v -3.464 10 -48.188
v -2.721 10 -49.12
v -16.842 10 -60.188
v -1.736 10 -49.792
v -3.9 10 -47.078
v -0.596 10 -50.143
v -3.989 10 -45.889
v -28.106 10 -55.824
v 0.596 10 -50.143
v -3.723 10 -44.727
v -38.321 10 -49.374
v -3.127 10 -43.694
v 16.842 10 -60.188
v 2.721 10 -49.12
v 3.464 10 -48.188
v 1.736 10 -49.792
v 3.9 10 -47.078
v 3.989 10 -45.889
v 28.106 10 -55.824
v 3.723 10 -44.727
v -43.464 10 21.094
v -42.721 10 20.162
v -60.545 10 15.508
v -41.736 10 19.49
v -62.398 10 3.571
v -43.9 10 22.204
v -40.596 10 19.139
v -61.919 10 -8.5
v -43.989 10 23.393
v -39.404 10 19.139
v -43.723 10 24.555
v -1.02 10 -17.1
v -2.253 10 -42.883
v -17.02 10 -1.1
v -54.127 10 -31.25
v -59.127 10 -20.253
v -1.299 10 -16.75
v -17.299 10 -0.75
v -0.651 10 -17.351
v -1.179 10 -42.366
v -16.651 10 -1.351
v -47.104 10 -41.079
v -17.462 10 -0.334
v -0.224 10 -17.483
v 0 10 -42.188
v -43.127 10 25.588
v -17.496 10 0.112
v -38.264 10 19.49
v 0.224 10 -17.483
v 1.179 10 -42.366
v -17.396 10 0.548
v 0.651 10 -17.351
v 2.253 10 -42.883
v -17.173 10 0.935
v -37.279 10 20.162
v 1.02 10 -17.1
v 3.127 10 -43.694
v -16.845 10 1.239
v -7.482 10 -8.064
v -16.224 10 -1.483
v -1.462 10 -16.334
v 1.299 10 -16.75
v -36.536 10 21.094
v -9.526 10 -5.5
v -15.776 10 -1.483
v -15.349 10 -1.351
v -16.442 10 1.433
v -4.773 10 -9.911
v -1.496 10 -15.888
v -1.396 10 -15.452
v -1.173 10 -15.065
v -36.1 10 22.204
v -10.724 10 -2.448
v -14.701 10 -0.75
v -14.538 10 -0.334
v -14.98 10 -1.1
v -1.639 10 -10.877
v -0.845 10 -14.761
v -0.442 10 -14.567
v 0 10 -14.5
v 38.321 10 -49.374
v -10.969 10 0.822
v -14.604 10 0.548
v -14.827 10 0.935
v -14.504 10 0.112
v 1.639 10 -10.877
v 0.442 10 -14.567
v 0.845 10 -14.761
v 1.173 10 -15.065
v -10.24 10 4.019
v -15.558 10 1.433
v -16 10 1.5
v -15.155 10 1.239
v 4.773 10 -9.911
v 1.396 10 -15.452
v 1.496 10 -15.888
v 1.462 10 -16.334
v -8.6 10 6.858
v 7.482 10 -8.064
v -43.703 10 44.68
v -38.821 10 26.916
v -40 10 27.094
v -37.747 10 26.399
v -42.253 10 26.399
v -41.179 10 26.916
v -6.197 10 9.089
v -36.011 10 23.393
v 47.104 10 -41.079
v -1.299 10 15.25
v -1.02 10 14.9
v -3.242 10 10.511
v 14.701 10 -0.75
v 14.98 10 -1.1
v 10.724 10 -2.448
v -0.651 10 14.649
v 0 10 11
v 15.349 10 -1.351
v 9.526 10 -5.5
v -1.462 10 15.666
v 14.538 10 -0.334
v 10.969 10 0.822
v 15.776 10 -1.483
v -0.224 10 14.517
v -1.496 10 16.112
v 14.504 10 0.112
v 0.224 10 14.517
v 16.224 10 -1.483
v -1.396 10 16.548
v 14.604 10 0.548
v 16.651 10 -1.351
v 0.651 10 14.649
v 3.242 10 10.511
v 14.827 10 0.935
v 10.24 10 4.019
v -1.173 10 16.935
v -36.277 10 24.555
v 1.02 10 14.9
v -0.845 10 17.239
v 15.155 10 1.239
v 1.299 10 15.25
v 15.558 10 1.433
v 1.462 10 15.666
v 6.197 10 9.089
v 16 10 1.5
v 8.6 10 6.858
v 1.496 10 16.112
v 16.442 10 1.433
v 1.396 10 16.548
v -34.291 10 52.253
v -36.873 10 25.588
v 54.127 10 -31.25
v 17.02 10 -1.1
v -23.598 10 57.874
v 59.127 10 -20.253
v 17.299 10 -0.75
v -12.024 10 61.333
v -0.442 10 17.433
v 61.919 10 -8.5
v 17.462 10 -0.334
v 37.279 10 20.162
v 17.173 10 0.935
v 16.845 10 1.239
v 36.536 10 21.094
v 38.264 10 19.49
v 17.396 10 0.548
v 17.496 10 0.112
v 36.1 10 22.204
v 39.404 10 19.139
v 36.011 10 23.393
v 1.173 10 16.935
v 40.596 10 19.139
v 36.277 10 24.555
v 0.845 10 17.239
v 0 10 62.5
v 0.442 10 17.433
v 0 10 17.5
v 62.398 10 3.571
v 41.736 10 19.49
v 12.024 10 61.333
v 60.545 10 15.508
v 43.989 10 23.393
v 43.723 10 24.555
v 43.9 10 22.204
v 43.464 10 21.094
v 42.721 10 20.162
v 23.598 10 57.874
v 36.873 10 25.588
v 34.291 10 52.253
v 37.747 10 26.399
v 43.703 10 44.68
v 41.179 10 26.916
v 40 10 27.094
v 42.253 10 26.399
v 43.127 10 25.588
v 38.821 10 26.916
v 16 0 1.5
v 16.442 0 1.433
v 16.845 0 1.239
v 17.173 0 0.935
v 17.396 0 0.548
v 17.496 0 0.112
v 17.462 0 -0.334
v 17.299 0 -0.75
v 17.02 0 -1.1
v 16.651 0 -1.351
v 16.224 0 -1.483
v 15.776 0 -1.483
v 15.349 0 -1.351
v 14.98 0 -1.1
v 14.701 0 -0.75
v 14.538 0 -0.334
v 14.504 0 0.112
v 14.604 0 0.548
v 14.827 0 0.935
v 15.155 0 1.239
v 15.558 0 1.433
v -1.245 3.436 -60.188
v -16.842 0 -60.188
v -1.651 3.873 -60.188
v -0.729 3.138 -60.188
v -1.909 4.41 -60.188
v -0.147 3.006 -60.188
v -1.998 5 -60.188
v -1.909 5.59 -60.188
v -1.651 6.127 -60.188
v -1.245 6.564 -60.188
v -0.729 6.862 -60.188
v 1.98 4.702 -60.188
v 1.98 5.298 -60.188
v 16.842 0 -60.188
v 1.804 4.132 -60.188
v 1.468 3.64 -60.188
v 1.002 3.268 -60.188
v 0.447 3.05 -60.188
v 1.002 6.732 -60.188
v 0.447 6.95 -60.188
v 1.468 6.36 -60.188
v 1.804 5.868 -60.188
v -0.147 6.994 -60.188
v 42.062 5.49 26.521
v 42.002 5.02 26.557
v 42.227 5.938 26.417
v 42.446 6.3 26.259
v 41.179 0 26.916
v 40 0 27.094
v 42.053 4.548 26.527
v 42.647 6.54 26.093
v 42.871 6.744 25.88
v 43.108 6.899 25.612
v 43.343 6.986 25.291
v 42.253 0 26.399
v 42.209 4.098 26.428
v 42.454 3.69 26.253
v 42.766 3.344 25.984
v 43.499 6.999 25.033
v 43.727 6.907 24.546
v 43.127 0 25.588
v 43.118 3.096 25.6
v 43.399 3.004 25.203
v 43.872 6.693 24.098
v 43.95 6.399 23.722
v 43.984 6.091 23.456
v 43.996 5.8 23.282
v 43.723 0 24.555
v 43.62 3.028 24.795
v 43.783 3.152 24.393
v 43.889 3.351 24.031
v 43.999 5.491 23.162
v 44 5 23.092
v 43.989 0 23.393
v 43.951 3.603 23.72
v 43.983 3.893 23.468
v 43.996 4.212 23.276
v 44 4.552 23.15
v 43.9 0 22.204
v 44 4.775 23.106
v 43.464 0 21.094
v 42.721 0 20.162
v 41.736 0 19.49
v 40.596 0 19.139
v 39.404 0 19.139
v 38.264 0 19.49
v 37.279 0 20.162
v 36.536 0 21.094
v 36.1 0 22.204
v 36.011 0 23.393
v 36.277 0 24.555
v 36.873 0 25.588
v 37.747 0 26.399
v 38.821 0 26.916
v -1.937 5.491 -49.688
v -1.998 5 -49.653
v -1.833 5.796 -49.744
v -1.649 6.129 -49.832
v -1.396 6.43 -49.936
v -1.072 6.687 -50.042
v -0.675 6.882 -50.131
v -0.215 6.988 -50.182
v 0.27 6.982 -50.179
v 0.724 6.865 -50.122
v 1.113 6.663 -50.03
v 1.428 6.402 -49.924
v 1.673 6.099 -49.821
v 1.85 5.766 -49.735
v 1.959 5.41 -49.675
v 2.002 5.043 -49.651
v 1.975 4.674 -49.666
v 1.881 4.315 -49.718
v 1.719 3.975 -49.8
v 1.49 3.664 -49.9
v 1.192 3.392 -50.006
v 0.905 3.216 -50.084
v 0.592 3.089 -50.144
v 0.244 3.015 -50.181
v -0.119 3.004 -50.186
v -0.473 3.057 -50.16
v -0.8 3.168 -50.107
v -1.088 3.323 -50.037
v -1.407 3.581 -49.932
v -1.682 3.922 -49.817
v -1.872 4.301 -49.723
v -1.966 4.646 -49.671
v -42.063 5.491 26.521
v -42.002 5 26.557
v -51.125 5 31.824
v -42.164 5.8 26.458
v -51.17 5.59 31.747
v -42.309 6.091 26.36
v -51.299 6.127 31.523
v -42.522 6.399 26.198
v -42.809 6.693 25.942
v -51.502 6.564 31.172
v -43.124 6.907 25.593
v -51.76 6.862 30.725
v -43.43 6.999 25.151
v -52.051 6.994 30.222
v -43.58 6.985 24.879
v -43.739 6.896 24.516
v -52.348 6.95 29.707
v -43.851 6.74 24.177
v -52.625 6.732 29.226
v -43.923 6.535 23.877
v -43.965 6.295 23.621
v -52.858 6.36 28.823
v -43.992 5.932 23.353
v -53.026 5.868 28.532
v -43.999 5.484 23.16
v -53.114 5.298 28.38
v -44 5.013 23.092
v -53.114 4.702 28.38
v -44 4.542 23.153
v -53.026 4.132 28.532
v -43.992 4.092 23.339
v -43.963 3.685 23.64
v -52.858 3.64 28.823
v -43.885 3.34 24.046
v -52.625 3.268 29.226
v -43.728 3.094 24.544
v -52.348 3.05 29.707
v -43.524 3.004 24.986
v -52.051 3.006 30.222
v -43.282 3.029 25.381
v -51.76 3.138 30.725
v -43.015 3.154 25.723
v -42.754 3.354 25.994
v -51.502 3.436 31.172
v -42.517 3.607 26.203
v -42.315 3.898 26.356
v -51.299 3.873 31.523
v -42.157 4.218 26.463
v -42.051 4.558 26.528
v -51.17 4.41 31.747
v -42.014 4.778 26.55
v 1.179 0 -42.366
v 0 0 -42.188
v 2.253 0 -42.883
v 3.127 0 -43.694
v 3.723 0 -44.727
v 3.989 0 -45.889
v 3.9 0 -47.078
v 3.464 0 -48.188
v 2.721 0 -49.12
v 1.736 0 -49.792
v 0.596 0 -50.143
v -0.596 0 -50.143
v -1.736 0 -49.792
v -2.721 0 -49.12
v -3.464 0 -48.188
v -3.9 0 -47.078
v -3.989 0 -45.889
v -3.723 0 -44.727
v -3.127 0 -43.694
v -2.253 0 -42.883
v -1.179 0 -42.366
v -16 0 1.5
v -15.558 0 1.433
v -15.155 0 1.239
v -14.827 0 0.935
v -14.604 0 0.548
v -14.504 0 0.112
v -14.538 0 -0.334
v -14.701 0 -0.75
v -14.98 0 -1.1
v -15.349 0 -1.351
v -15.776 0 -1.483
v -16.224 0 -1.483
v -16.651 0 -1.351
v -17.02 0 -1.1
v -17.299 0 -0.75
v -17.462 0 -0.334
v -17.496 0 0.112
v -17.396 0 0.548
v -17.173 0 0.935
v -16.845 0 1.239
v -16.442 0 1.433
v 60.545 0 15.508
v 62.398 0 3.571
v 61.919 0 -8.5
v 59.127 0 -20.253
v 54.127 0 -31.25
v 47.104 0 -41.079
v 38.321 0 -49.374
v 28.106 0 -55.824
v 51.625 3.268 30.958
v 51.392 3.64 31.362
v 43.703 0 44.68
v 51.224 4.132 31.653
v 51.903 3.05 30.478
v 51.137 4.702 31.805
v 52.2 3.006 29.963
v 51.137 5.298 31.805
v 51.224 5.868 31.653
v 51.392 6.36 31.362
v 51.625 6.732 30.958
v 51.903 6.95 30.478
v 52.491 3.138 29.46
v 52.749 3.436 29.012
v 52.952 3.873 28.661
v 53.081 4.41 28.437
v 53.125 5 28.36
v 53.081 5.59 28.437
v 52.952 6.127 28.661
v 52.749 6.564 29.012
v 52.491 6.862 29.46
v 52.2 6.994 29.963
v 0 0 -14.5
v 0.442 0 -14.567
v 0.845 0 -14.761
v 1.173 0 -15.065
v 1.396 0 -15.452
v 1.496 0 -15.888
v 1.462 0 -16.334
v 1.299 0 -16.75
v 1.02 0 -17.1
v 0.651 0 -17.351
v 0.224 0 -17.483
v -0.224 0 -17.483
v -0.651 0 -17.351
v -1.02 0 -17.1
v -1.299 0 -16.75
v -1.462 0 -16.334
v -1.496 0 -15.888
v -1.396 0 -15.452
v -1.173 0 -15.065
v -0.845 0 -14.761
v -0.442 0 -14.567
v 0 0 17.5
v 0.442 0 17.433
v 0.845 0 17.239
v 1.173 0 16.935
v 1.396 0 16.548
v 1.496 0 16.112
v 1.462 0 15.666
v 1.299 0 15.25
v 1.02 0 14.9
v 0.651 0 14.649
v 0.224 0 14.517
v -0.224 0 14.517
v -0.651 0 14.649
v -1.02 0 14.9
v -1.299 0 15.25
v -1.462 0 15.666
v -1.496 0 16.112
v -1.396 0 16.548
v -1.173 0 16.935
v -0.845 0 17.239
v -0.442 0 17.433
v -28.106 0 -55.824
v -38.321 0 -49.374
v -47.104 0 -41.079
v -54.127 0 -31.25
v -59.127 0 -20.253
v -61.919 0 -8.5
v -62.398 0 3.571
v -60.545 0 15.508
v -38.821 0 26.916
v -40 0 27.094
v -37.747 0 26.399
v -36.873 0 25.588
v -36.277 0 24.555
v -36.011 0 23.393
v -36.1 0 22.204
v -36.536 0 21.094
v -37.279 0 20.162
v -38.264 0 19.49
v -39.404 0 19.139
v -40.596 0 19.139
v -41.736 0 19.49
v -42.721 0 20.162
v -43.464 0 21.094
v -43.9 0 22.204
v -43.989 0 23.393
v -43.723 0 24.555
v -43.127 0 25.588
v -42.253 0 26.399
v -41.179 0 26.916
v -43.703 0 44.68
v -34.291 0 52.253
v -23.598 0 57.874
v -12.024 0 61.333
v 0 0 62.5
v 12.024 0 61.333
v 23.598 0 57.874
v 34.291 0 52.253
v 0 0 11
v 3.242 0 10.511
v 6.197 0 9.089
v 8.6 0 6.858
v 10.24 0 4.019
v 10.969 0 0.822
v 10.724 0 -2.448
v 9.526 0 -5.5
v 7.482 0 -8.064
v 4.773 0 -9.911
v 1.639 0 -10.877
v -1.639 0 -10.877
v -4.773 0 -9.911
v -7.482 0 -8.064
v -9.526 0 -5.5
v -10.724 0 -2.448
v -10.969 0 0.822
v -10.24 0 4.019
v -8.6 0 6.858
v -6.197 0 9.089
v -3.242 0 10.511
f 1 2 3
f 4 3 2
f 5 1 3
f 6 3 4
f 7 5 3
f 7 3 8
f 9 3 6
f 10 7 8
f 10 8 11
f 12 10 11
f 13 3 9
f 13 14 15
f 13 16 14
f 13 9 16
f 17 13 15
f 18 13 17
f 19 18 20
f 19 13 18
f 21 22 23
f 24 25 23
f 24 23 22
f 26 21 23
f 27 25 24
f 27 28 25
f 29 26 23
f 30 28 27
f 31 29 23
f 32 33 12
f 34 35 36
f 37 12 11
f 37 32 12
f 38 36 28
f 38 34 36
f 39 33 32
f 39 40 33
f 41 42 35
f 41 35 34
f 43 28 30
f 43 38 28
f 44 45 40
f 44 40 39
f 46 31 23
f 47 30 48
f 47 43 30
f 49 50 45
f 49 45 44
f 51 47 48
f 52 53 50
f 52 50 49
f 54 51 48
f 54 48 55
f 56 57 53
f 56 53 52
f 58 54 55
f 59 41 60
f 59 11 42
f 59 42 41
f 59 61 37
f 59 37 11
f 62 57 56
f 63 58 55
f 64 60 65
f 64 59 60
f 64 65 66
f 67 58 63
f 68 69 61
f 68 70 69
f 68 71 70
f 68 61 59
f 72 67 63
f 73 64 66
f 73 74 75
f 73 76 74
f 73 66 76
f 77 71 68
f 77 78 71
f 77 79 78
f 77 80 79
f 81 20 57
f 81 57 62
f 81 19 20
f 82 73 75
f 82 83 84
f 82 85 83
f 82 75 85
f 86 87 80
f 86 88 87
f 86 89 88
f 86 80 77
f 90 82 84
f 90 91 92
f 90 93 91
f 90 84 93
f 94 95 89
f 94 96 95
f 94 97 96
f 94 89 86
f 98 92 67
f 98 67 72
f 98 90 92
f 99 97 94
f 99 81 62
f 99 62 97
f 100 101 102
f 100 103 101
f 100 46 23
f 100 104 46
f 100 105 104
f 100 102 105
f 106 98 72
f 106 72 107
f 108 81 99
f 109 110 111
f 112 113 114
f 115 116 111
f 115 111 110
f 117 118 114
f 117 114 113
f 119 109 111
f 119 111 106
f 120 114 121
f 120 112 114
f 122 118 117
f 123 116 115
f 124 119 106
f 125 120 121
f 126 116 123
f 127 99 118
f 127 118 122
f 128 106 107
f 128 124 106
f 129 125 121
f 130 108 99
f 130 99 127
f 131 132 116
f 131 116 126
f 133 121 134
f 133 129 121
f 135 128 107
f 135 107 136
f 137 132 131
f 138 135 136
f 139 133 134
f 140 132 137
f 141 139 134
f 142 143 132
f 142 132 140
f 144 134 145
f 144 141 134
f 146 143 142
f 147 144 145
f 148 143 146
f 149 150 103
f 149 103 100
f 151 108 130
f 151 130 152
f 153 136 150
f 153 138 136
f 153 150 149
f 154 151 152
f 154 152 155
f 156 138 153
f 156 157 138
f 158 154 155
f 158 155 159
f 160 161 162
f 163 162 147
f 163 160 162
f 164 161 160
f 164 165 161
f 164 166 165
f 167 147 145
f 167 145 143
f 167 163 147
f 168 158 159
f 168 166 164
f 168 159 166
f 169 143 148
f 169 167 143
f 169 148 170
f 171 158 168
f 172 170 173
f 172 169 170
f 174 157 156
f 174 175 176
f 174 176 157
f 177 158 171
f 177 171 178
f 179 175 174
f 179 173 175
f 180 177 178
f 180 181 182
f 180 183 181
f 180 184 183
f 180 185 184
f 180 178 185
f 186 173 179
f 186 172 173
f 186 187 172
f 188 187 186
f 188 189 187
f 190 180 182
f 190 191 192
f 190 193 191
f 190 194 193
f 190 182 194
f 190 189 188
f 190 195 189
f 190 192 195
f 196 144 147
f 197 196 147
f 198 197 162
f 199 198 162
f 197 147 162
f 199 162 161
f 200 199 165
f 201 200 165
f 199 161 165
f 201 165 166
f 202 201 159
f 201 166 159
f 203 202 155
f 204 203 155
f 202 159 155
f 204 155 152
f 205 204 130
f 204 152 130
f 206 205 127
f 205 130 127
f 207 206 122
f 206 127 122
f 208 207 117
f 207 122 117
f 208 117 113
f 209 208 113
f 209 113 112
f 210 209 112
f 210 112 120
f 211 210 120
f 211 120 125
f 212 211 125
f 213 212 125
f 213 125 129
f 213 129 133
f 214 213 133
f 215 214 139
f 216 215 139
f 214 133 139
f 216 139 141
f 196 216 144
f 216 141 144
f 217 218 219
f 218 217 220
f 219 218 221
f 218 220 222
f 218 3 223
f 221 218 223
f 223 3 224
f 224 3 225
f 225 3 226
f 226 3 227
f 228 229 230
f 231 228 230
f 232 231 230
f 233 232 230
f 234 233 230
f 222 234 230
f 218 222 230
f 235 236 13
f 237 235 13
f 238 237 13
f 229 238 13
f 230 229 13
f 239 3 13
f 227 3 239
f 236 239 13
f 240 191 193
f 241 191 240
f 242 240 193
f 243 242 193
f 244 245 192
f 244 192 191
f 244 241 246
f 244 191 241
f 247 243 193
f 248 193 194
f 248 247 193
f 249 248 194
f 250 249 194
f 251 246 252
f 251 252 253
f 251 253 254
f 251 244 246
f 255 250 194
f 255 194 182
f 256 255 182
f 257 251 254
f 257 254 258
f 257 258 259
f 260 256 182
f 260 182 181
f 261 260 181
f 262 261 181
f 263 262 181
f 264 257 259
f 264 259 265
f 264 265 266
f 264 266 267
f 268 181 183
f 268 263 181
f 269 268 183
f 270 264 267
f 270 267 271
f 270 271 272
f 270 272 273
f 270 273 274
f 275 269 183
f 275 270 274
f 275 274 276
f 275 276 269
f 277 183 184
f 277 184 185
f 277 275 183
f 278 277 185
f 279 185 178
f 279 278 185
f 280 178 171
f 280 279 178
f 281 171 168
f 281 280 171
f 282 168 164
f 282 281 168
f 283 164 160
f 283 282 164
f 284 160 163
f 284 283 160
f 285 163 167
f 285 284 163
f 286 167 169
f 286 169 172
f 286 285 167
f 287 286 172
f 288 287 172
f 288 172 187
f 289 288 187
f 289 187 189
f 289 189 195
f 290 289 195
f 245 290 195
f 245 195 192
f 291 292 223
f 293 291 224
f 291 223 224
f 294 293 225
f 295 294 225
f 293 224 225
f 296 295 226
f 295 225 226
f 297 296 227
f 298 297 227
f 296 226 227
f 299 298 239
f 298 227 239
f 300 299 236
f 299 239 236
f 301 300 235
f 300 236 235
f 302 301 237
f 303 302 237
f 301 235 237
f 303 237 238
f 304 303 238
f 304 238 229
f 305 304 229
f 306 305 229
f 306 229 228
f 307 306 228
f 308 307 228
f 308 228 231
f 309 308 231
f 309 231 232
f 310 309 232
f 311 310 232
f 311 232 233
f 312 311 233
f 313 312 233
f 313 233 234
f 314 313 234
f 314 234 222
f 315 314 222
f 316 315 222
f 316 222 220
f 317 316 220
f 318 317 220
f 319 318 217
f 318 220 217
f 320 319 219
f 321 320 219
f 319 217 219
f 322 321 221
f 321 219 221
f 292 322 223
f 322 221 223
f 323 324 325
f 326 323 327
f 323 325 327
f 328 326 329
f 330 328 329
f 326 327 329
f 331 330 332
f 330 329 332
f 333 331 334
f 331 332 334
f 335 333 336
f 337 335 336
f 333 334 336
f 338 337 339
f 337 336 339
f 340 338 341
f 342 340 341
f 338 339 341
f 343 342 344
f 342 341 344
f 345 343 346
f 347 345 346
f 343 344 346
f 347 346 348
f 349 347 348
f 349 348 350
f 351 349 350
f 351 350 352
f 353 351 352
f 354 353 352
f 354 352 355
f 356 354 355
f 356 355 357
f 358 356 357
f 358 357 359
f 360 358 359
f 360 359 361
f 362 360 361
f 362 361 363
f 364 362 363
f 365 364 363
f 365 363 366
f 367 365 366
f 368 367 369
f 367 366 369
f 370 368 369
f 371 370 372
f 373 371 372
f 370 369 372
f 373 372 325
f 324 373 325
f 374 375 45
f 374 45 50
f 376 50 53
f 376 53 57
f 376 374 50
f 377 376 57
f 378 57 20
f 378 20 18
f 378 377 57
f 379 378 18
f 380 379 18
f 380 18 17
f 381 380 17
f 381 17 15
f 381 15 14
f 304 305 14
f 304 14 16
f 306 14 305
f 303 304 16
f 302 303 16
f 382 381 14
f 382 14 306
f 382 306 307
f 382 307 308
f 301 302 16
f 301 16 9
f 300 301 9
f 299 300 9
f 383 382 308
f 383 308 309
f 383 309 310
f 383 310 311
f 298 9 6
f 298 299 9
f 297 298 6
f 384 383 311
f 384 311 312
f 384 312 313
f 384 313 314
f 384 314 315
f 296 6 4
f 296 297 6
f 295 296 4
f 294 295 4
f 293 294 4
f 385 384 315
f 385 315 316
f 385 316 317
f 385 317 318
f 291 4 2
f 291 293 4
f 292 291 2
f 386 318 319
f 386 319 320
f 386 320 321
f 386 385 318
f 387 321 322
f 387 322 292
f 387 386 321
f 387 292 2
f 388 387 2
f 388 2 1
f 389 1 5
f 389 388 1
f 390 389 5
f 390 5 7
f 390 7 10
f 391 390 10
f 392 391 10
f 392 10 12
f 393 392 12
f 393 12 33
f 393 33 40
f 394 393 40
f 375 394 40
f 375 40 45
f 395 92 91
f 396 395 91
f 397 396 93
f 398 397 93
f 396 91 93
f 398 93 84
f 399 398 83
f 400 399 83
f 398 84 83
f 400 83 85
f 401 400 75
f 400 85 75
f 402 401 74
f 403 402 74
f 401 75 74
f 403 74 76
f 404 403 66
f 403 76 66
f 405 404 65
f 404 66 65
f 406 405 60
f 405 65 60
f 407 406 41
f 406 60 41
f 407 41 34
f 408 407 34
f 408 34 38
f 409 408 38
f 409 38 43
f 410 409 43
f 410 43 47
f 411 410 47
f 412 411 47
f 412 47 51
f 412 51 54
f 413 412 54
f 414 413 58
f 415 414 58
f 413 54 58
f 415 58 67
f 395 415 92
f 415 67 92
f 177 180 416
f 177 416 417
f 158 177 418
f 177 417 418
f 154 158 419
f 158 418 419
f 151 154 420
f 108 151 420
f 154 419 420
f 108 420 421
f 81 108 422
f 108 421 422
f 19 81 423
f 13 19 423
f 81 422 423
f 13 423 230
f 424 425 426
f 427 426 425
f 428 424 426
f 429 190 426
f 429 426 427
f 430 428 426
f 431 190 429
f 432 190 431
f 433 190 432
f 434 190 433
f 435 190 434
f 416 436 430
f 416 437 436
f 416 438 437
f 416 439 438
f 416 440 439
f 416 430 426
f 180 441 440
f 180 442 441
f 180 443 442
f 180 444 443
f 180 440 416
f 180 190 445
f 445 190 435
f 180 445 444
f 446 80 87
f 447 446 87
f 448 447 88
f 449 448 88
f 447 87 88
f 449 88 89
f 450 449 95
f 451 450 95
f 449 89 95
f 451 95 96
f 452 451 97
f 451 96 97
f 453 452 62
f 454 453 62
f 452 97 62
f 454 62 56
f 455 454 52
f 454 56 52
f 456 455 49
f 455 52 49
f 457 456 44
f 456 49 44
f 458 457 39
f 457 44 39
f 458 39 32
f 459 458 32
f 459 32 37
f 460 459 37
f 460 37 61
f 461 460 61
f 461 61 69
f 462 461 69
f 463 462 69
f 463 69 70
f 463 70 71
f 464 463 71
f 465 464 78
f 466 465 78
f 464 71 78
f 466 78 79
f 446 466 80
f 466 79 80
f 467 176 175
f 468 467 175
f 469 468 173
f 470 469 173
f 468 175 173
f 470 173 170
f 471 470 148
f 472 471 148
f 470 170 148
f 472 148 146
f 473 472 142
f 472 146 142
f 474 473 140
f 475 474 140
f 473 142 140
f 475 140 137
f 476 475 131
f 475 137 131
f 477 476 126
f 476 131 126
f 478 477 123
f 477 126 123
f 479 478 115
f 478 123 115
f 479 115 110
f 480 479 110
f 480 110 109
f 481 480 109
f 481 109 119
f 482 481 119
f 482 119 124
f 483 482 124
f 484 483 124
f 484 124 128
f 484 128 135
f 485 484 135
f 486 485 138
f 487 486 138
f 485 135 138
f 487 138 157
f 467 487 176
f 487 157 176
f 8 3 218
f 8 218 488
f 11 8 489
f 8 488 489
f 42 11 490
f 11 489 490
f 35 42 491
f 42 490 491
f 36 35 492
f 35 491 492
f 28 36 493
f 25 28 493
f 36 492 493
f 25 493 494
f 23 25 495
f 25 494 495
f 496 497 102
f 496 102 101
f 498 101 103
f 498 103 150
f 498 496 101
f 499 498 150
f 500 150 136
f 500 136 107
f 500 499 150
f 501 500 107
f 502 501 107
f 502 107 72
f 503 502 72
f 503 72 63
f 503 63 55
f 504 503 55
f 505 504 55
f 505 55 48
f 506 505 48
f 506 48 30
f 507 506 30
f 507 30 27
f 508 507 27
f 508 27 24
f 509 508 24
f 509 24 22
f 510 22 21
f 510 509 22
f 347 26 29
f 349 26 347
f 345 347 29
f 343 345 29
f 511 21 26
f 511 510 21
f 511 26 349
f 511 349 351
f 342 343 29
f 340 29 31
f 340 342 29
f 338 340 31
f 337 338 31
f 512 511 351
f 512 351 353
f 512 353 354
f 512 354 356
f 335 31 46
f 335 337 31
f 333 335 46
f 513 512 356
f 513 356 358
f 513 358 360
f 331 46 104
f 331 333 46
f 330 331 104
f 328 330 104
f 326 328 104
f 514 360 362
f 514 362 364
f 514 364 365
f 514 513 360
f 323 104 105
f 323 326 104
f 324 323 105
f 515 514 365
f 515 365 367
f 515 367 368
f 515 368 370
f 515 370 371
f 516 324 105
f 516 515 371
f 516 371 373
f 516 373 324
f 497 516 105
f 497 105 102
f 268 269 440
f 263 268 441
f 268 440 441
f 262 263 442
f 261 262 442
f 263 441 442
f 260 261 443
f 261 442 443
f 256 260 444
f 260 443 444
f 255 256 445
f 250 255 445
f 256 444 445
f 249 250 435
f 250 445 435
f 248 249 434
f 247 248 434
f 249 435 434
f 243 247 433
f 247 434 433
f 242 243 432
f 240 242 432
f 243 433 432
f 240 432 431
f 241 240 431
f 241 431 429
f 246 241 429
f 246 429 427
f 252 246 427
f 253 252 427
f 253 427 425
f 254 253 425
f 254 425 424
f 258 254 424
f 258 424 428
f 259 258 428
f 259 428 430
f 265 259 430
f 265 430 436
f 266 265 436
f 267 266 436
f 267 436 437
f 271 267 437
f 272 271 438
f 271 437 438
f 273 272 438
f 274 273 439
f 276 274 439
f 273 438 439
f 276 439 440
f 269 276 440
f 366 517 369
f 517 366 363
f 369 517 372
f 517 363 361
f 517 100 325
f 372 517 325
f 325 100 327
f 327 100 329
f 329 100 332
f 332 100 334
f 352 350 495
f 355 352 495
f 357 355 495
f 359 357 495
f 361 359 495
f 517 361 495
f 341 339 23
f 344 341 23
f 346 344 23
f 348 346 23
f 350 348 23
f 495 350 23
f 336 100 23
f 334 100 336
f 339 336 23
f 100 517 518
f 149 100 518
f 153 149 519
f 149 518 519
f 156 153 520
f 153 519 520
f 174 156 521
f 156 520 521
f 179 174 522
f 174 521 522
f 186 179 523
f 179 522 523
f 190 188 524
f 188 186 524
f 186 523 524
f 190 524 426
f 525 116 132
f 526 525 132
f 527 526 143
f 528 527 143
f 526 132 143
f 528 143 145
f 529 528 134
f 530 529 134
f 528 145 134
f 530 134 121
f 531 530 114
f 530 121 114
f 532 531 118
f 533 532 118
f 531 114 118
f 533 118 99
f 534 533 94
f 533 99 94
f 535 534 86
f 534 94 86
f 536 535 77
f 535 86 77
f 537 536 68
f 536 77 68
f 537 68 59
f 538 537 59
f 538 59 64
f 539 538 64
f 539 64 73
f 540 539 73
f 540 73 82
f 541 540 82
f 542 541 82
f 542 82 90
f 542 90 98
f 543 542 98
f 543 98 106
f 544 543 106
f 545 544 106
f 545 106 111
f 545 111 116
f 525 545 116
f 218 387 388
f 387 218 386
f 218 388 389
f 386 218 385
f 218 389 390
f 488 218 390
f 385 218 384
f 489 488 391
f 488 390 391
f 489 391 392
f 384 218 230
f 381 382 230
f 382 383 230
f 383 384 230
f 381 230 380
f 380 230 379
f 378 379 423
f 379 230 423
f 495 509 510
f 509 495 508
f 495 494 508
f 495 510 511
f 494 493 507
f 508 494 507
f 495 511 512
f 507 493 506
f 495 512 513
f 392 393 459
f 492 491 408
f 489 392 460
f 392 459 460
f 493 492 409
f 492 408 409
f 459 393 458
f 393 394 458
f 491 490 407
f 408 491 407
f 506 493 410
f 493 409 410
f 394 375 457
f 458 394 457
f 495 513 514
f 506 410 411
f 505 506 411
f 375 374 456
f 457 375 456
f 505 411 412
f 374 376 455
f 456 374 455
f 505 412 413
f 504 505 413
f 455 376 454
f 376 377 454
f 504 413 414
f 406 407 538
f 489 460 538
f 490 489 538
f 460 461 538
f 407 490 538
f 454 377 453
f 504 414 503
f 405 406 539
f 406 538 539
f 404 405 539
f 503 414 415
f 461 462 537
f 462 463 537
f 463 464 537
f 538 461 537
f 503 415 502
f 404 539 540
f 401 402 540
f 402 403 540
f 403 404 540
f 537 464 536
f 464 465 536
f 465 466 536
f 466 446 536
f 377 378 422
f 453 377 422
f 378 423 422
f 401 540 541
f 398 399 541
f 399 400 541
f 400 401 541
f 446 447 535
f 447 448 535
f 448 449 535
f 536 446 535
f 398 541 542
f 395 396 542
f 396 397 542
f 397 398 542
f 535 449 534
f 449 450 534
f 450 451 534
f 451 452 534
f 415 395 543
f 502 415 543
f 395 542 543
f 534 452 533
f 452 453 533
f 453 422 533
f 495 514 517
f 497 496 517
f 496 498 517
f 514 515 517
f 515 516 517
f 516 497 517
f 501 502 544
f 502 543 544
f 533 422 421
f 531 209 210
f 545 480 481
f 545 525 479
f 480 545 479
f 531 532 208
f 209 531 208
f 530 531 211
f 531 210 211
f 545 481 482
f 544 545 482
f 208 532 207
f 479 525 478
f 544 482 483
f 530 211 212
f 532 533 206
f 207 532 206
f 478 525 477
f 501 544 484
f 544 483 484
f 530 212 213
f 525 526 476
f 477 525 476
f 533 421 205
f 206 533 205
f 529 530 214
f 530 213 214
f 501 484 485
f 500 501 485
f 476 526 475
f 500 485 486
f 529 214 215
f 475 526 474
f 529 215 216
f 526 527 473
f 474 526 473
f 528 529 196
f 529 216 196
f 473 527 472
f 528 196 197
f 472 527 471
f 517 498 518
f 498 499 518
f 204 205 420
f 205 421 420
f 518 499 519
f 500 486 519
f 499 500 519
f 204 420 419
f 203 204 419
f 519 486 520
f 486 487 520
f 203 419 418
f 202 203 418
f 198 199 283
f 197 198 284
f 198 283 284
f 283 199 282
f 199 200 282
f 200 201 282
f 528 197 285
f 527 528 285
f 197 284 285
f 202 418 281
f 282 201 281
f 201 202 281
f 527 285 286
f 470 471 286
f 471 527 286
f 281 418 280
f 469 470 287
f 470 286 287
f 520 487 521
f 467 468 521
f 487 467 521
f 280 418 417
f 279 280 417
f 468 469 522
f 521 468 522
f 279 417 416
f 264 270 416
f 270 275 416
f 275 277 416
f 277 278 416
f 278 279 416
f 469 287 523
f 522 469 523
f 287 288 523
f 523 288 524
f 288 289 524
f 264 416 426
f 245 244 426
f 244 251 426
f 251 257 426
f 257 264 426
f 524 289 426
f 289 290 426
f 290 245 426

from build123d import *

# Parameters (mm, degrees)
SKETCH1_R           = 62.5
SKETCH1_R_2         = 4
BOSS_EXTRUDE1_DEPTH = 10
SKETCH2_W           = 43.972180284
SKETCH2_H           = 8.711954994
CUT_EXTRUDE1_DEPTH  = 10
SKETCH3_R           = 2
CUT_EXTRUDE2_DEPTH  = 12
SKETCH4_R           = 2
CUT_EXTRUDE3_DEPTH  = 12
SKETCH5_R           = 2
CUT_EXTRUDE4_DEPTH  = 12
SKETCH6_R           = 11
CUT_EXTRUDE5_DEPTH  = 12
SKETCH7_R           = 1.5
CUT_EXTRUDE6_DEPTH  = 10


with BuildPart() as part:
    # Sketch1 → Boss-Extrude1 (new body)
    with BuildSketch(Plane(origin=(0, 0, 0), x_dir=(1, 0, 0), z_dir=(0, 1, 0))):
        with Locations(Location((0, 0, 0), (0, 0, 270))):
            Circle(SKETCH1_R)
        with Locations(Location((0, 46.188021535, 0), (0, 0, 270))):
            Circle(SKETCH1_R_2, mode=Mode.SUBTRACT)
        with Locations(Location((40, -23.094010768, 0), (0, 0, 270))):
            Circle(SKETCH1_R_2, mode=Mode.SUBTRACT)
        with Locations(Location((-40, -23.094010768, 0), (0, 0, 270))):
            Circle(SKETCH1_R_2, mode=Mode.SUBTRACT)
    extrude(amount=BOSS_EXTRUDE1_DEPTH)

    # Sketch2 → Cut-Extrude1 (cut)
    with BuildSketch(Plane(origin=(0, 10, 0), x_dir=(1, 0, 0), z_dir=(0, 1, 0))):
        Polygon((-39.581845605, -51.818275424), (-64.713070734, -8.289716646), (-77.687460418, -15.780484023), (-52.55623529, -59.309042801), align=None)
        Polygon((40.609652539, -50.038061596), (63.321086643, -10.700703814), (75.641288558, -17.813775707), (52.929854454, -57.151133488), align=None)
        with Locations((0.471086747, 64.543999032)):
            Rectangle(SKETCH2_W, SKETCH2_H)
    extrude(amount=-CUT_EXTRUDE1_DEPTH, mode=Mode.SUBTRACT)

    # Sketch3 → Cut-Extrude2 (cut)
    with BuildSketch(Plane(origin=(52.124355653, 0, 30.094010768), x_dir=(0.49999999999999983, 0, -0.8660254037844387), z_dir=(0.8660254037844387, 0, 0.49999999999999983))):
        with Locations((0.001973272, 5)):
            Circle(SKETCH3_R)
    extrude(amount=-CUT_EXTRUDE2_DEPTH, mode=Mode.SUBTRACT)

    # Sketch4 → Cut-Extrude3 (cut)
    with BuildSketch(Plane(origin=(-52.124355653, 0, 30.094010768), x_dir=(0.5000000000000002, 0, 0.8660254037844386), z_dir=(-0.8660254037844385, 0, 0.5000000000000001))):
        with Locations((-0.001973272, 5)):
            Circle(SKETCH4_R)
    extrude(amount=-CUT_EXTRUDE3_DEPTH, mode=Mode.SUBTRACT)

    # Sketch5 → Cut-Extrude4 (cut)
    with BuildSketch(Plane(origin=(0, 0, -60.188021535), x_dir=(-1, 0, 0), z_dir=(0, 0, -1))):
        with Locations((-0.001973272, 5)):
            Circle(SKETCH5_R)
    extrude(amount=-CUT_EXTRUDE4_DEPTH, mode=Mode.SUBTRACT)

    # Sketch6 → Cut-Extrude5 (cut)
    with BuildSketch(Plane(origin=(0, 10, 0), x_dir=(1, 0, 0), z_dir=(0, 1, 0))):
        with Locations(Location((0, 0, 0), (0, 0, 270))):
            Circle(SKETCH6_R)
    extrude(amount=-CUT_EXTRUDE5_DEPTH, mode=Mode.SUBTRACT)

    # Sketch7 → Cut-Extrude6 (cut)
    with BuildSketch(Plane(origin=(0, 10, 0), x_dir=(1, 0, 0), z_dir=(0, 1, 0))):
        with Locations(Location((-16, 0, 0), (0, 0, 270))):
            Circle(SKETCH7_R)
        with Locations(Location((0, 16, 0), (0, 0, 270))):
            Circle(SKETCH7_R)
        with Locations(Location((16, 0, 0), (0, 0, 270))):
            Circle(SKETCH7_R)
        with Locations(Location((0, -16, 0), (0, 0, 270))):
            Circle(SKETCH7_R)
    extrude(amount=-CUT_EXTRUDE6_DEPTH, mode=Mode.SUBTRACT)


solid = part.part
